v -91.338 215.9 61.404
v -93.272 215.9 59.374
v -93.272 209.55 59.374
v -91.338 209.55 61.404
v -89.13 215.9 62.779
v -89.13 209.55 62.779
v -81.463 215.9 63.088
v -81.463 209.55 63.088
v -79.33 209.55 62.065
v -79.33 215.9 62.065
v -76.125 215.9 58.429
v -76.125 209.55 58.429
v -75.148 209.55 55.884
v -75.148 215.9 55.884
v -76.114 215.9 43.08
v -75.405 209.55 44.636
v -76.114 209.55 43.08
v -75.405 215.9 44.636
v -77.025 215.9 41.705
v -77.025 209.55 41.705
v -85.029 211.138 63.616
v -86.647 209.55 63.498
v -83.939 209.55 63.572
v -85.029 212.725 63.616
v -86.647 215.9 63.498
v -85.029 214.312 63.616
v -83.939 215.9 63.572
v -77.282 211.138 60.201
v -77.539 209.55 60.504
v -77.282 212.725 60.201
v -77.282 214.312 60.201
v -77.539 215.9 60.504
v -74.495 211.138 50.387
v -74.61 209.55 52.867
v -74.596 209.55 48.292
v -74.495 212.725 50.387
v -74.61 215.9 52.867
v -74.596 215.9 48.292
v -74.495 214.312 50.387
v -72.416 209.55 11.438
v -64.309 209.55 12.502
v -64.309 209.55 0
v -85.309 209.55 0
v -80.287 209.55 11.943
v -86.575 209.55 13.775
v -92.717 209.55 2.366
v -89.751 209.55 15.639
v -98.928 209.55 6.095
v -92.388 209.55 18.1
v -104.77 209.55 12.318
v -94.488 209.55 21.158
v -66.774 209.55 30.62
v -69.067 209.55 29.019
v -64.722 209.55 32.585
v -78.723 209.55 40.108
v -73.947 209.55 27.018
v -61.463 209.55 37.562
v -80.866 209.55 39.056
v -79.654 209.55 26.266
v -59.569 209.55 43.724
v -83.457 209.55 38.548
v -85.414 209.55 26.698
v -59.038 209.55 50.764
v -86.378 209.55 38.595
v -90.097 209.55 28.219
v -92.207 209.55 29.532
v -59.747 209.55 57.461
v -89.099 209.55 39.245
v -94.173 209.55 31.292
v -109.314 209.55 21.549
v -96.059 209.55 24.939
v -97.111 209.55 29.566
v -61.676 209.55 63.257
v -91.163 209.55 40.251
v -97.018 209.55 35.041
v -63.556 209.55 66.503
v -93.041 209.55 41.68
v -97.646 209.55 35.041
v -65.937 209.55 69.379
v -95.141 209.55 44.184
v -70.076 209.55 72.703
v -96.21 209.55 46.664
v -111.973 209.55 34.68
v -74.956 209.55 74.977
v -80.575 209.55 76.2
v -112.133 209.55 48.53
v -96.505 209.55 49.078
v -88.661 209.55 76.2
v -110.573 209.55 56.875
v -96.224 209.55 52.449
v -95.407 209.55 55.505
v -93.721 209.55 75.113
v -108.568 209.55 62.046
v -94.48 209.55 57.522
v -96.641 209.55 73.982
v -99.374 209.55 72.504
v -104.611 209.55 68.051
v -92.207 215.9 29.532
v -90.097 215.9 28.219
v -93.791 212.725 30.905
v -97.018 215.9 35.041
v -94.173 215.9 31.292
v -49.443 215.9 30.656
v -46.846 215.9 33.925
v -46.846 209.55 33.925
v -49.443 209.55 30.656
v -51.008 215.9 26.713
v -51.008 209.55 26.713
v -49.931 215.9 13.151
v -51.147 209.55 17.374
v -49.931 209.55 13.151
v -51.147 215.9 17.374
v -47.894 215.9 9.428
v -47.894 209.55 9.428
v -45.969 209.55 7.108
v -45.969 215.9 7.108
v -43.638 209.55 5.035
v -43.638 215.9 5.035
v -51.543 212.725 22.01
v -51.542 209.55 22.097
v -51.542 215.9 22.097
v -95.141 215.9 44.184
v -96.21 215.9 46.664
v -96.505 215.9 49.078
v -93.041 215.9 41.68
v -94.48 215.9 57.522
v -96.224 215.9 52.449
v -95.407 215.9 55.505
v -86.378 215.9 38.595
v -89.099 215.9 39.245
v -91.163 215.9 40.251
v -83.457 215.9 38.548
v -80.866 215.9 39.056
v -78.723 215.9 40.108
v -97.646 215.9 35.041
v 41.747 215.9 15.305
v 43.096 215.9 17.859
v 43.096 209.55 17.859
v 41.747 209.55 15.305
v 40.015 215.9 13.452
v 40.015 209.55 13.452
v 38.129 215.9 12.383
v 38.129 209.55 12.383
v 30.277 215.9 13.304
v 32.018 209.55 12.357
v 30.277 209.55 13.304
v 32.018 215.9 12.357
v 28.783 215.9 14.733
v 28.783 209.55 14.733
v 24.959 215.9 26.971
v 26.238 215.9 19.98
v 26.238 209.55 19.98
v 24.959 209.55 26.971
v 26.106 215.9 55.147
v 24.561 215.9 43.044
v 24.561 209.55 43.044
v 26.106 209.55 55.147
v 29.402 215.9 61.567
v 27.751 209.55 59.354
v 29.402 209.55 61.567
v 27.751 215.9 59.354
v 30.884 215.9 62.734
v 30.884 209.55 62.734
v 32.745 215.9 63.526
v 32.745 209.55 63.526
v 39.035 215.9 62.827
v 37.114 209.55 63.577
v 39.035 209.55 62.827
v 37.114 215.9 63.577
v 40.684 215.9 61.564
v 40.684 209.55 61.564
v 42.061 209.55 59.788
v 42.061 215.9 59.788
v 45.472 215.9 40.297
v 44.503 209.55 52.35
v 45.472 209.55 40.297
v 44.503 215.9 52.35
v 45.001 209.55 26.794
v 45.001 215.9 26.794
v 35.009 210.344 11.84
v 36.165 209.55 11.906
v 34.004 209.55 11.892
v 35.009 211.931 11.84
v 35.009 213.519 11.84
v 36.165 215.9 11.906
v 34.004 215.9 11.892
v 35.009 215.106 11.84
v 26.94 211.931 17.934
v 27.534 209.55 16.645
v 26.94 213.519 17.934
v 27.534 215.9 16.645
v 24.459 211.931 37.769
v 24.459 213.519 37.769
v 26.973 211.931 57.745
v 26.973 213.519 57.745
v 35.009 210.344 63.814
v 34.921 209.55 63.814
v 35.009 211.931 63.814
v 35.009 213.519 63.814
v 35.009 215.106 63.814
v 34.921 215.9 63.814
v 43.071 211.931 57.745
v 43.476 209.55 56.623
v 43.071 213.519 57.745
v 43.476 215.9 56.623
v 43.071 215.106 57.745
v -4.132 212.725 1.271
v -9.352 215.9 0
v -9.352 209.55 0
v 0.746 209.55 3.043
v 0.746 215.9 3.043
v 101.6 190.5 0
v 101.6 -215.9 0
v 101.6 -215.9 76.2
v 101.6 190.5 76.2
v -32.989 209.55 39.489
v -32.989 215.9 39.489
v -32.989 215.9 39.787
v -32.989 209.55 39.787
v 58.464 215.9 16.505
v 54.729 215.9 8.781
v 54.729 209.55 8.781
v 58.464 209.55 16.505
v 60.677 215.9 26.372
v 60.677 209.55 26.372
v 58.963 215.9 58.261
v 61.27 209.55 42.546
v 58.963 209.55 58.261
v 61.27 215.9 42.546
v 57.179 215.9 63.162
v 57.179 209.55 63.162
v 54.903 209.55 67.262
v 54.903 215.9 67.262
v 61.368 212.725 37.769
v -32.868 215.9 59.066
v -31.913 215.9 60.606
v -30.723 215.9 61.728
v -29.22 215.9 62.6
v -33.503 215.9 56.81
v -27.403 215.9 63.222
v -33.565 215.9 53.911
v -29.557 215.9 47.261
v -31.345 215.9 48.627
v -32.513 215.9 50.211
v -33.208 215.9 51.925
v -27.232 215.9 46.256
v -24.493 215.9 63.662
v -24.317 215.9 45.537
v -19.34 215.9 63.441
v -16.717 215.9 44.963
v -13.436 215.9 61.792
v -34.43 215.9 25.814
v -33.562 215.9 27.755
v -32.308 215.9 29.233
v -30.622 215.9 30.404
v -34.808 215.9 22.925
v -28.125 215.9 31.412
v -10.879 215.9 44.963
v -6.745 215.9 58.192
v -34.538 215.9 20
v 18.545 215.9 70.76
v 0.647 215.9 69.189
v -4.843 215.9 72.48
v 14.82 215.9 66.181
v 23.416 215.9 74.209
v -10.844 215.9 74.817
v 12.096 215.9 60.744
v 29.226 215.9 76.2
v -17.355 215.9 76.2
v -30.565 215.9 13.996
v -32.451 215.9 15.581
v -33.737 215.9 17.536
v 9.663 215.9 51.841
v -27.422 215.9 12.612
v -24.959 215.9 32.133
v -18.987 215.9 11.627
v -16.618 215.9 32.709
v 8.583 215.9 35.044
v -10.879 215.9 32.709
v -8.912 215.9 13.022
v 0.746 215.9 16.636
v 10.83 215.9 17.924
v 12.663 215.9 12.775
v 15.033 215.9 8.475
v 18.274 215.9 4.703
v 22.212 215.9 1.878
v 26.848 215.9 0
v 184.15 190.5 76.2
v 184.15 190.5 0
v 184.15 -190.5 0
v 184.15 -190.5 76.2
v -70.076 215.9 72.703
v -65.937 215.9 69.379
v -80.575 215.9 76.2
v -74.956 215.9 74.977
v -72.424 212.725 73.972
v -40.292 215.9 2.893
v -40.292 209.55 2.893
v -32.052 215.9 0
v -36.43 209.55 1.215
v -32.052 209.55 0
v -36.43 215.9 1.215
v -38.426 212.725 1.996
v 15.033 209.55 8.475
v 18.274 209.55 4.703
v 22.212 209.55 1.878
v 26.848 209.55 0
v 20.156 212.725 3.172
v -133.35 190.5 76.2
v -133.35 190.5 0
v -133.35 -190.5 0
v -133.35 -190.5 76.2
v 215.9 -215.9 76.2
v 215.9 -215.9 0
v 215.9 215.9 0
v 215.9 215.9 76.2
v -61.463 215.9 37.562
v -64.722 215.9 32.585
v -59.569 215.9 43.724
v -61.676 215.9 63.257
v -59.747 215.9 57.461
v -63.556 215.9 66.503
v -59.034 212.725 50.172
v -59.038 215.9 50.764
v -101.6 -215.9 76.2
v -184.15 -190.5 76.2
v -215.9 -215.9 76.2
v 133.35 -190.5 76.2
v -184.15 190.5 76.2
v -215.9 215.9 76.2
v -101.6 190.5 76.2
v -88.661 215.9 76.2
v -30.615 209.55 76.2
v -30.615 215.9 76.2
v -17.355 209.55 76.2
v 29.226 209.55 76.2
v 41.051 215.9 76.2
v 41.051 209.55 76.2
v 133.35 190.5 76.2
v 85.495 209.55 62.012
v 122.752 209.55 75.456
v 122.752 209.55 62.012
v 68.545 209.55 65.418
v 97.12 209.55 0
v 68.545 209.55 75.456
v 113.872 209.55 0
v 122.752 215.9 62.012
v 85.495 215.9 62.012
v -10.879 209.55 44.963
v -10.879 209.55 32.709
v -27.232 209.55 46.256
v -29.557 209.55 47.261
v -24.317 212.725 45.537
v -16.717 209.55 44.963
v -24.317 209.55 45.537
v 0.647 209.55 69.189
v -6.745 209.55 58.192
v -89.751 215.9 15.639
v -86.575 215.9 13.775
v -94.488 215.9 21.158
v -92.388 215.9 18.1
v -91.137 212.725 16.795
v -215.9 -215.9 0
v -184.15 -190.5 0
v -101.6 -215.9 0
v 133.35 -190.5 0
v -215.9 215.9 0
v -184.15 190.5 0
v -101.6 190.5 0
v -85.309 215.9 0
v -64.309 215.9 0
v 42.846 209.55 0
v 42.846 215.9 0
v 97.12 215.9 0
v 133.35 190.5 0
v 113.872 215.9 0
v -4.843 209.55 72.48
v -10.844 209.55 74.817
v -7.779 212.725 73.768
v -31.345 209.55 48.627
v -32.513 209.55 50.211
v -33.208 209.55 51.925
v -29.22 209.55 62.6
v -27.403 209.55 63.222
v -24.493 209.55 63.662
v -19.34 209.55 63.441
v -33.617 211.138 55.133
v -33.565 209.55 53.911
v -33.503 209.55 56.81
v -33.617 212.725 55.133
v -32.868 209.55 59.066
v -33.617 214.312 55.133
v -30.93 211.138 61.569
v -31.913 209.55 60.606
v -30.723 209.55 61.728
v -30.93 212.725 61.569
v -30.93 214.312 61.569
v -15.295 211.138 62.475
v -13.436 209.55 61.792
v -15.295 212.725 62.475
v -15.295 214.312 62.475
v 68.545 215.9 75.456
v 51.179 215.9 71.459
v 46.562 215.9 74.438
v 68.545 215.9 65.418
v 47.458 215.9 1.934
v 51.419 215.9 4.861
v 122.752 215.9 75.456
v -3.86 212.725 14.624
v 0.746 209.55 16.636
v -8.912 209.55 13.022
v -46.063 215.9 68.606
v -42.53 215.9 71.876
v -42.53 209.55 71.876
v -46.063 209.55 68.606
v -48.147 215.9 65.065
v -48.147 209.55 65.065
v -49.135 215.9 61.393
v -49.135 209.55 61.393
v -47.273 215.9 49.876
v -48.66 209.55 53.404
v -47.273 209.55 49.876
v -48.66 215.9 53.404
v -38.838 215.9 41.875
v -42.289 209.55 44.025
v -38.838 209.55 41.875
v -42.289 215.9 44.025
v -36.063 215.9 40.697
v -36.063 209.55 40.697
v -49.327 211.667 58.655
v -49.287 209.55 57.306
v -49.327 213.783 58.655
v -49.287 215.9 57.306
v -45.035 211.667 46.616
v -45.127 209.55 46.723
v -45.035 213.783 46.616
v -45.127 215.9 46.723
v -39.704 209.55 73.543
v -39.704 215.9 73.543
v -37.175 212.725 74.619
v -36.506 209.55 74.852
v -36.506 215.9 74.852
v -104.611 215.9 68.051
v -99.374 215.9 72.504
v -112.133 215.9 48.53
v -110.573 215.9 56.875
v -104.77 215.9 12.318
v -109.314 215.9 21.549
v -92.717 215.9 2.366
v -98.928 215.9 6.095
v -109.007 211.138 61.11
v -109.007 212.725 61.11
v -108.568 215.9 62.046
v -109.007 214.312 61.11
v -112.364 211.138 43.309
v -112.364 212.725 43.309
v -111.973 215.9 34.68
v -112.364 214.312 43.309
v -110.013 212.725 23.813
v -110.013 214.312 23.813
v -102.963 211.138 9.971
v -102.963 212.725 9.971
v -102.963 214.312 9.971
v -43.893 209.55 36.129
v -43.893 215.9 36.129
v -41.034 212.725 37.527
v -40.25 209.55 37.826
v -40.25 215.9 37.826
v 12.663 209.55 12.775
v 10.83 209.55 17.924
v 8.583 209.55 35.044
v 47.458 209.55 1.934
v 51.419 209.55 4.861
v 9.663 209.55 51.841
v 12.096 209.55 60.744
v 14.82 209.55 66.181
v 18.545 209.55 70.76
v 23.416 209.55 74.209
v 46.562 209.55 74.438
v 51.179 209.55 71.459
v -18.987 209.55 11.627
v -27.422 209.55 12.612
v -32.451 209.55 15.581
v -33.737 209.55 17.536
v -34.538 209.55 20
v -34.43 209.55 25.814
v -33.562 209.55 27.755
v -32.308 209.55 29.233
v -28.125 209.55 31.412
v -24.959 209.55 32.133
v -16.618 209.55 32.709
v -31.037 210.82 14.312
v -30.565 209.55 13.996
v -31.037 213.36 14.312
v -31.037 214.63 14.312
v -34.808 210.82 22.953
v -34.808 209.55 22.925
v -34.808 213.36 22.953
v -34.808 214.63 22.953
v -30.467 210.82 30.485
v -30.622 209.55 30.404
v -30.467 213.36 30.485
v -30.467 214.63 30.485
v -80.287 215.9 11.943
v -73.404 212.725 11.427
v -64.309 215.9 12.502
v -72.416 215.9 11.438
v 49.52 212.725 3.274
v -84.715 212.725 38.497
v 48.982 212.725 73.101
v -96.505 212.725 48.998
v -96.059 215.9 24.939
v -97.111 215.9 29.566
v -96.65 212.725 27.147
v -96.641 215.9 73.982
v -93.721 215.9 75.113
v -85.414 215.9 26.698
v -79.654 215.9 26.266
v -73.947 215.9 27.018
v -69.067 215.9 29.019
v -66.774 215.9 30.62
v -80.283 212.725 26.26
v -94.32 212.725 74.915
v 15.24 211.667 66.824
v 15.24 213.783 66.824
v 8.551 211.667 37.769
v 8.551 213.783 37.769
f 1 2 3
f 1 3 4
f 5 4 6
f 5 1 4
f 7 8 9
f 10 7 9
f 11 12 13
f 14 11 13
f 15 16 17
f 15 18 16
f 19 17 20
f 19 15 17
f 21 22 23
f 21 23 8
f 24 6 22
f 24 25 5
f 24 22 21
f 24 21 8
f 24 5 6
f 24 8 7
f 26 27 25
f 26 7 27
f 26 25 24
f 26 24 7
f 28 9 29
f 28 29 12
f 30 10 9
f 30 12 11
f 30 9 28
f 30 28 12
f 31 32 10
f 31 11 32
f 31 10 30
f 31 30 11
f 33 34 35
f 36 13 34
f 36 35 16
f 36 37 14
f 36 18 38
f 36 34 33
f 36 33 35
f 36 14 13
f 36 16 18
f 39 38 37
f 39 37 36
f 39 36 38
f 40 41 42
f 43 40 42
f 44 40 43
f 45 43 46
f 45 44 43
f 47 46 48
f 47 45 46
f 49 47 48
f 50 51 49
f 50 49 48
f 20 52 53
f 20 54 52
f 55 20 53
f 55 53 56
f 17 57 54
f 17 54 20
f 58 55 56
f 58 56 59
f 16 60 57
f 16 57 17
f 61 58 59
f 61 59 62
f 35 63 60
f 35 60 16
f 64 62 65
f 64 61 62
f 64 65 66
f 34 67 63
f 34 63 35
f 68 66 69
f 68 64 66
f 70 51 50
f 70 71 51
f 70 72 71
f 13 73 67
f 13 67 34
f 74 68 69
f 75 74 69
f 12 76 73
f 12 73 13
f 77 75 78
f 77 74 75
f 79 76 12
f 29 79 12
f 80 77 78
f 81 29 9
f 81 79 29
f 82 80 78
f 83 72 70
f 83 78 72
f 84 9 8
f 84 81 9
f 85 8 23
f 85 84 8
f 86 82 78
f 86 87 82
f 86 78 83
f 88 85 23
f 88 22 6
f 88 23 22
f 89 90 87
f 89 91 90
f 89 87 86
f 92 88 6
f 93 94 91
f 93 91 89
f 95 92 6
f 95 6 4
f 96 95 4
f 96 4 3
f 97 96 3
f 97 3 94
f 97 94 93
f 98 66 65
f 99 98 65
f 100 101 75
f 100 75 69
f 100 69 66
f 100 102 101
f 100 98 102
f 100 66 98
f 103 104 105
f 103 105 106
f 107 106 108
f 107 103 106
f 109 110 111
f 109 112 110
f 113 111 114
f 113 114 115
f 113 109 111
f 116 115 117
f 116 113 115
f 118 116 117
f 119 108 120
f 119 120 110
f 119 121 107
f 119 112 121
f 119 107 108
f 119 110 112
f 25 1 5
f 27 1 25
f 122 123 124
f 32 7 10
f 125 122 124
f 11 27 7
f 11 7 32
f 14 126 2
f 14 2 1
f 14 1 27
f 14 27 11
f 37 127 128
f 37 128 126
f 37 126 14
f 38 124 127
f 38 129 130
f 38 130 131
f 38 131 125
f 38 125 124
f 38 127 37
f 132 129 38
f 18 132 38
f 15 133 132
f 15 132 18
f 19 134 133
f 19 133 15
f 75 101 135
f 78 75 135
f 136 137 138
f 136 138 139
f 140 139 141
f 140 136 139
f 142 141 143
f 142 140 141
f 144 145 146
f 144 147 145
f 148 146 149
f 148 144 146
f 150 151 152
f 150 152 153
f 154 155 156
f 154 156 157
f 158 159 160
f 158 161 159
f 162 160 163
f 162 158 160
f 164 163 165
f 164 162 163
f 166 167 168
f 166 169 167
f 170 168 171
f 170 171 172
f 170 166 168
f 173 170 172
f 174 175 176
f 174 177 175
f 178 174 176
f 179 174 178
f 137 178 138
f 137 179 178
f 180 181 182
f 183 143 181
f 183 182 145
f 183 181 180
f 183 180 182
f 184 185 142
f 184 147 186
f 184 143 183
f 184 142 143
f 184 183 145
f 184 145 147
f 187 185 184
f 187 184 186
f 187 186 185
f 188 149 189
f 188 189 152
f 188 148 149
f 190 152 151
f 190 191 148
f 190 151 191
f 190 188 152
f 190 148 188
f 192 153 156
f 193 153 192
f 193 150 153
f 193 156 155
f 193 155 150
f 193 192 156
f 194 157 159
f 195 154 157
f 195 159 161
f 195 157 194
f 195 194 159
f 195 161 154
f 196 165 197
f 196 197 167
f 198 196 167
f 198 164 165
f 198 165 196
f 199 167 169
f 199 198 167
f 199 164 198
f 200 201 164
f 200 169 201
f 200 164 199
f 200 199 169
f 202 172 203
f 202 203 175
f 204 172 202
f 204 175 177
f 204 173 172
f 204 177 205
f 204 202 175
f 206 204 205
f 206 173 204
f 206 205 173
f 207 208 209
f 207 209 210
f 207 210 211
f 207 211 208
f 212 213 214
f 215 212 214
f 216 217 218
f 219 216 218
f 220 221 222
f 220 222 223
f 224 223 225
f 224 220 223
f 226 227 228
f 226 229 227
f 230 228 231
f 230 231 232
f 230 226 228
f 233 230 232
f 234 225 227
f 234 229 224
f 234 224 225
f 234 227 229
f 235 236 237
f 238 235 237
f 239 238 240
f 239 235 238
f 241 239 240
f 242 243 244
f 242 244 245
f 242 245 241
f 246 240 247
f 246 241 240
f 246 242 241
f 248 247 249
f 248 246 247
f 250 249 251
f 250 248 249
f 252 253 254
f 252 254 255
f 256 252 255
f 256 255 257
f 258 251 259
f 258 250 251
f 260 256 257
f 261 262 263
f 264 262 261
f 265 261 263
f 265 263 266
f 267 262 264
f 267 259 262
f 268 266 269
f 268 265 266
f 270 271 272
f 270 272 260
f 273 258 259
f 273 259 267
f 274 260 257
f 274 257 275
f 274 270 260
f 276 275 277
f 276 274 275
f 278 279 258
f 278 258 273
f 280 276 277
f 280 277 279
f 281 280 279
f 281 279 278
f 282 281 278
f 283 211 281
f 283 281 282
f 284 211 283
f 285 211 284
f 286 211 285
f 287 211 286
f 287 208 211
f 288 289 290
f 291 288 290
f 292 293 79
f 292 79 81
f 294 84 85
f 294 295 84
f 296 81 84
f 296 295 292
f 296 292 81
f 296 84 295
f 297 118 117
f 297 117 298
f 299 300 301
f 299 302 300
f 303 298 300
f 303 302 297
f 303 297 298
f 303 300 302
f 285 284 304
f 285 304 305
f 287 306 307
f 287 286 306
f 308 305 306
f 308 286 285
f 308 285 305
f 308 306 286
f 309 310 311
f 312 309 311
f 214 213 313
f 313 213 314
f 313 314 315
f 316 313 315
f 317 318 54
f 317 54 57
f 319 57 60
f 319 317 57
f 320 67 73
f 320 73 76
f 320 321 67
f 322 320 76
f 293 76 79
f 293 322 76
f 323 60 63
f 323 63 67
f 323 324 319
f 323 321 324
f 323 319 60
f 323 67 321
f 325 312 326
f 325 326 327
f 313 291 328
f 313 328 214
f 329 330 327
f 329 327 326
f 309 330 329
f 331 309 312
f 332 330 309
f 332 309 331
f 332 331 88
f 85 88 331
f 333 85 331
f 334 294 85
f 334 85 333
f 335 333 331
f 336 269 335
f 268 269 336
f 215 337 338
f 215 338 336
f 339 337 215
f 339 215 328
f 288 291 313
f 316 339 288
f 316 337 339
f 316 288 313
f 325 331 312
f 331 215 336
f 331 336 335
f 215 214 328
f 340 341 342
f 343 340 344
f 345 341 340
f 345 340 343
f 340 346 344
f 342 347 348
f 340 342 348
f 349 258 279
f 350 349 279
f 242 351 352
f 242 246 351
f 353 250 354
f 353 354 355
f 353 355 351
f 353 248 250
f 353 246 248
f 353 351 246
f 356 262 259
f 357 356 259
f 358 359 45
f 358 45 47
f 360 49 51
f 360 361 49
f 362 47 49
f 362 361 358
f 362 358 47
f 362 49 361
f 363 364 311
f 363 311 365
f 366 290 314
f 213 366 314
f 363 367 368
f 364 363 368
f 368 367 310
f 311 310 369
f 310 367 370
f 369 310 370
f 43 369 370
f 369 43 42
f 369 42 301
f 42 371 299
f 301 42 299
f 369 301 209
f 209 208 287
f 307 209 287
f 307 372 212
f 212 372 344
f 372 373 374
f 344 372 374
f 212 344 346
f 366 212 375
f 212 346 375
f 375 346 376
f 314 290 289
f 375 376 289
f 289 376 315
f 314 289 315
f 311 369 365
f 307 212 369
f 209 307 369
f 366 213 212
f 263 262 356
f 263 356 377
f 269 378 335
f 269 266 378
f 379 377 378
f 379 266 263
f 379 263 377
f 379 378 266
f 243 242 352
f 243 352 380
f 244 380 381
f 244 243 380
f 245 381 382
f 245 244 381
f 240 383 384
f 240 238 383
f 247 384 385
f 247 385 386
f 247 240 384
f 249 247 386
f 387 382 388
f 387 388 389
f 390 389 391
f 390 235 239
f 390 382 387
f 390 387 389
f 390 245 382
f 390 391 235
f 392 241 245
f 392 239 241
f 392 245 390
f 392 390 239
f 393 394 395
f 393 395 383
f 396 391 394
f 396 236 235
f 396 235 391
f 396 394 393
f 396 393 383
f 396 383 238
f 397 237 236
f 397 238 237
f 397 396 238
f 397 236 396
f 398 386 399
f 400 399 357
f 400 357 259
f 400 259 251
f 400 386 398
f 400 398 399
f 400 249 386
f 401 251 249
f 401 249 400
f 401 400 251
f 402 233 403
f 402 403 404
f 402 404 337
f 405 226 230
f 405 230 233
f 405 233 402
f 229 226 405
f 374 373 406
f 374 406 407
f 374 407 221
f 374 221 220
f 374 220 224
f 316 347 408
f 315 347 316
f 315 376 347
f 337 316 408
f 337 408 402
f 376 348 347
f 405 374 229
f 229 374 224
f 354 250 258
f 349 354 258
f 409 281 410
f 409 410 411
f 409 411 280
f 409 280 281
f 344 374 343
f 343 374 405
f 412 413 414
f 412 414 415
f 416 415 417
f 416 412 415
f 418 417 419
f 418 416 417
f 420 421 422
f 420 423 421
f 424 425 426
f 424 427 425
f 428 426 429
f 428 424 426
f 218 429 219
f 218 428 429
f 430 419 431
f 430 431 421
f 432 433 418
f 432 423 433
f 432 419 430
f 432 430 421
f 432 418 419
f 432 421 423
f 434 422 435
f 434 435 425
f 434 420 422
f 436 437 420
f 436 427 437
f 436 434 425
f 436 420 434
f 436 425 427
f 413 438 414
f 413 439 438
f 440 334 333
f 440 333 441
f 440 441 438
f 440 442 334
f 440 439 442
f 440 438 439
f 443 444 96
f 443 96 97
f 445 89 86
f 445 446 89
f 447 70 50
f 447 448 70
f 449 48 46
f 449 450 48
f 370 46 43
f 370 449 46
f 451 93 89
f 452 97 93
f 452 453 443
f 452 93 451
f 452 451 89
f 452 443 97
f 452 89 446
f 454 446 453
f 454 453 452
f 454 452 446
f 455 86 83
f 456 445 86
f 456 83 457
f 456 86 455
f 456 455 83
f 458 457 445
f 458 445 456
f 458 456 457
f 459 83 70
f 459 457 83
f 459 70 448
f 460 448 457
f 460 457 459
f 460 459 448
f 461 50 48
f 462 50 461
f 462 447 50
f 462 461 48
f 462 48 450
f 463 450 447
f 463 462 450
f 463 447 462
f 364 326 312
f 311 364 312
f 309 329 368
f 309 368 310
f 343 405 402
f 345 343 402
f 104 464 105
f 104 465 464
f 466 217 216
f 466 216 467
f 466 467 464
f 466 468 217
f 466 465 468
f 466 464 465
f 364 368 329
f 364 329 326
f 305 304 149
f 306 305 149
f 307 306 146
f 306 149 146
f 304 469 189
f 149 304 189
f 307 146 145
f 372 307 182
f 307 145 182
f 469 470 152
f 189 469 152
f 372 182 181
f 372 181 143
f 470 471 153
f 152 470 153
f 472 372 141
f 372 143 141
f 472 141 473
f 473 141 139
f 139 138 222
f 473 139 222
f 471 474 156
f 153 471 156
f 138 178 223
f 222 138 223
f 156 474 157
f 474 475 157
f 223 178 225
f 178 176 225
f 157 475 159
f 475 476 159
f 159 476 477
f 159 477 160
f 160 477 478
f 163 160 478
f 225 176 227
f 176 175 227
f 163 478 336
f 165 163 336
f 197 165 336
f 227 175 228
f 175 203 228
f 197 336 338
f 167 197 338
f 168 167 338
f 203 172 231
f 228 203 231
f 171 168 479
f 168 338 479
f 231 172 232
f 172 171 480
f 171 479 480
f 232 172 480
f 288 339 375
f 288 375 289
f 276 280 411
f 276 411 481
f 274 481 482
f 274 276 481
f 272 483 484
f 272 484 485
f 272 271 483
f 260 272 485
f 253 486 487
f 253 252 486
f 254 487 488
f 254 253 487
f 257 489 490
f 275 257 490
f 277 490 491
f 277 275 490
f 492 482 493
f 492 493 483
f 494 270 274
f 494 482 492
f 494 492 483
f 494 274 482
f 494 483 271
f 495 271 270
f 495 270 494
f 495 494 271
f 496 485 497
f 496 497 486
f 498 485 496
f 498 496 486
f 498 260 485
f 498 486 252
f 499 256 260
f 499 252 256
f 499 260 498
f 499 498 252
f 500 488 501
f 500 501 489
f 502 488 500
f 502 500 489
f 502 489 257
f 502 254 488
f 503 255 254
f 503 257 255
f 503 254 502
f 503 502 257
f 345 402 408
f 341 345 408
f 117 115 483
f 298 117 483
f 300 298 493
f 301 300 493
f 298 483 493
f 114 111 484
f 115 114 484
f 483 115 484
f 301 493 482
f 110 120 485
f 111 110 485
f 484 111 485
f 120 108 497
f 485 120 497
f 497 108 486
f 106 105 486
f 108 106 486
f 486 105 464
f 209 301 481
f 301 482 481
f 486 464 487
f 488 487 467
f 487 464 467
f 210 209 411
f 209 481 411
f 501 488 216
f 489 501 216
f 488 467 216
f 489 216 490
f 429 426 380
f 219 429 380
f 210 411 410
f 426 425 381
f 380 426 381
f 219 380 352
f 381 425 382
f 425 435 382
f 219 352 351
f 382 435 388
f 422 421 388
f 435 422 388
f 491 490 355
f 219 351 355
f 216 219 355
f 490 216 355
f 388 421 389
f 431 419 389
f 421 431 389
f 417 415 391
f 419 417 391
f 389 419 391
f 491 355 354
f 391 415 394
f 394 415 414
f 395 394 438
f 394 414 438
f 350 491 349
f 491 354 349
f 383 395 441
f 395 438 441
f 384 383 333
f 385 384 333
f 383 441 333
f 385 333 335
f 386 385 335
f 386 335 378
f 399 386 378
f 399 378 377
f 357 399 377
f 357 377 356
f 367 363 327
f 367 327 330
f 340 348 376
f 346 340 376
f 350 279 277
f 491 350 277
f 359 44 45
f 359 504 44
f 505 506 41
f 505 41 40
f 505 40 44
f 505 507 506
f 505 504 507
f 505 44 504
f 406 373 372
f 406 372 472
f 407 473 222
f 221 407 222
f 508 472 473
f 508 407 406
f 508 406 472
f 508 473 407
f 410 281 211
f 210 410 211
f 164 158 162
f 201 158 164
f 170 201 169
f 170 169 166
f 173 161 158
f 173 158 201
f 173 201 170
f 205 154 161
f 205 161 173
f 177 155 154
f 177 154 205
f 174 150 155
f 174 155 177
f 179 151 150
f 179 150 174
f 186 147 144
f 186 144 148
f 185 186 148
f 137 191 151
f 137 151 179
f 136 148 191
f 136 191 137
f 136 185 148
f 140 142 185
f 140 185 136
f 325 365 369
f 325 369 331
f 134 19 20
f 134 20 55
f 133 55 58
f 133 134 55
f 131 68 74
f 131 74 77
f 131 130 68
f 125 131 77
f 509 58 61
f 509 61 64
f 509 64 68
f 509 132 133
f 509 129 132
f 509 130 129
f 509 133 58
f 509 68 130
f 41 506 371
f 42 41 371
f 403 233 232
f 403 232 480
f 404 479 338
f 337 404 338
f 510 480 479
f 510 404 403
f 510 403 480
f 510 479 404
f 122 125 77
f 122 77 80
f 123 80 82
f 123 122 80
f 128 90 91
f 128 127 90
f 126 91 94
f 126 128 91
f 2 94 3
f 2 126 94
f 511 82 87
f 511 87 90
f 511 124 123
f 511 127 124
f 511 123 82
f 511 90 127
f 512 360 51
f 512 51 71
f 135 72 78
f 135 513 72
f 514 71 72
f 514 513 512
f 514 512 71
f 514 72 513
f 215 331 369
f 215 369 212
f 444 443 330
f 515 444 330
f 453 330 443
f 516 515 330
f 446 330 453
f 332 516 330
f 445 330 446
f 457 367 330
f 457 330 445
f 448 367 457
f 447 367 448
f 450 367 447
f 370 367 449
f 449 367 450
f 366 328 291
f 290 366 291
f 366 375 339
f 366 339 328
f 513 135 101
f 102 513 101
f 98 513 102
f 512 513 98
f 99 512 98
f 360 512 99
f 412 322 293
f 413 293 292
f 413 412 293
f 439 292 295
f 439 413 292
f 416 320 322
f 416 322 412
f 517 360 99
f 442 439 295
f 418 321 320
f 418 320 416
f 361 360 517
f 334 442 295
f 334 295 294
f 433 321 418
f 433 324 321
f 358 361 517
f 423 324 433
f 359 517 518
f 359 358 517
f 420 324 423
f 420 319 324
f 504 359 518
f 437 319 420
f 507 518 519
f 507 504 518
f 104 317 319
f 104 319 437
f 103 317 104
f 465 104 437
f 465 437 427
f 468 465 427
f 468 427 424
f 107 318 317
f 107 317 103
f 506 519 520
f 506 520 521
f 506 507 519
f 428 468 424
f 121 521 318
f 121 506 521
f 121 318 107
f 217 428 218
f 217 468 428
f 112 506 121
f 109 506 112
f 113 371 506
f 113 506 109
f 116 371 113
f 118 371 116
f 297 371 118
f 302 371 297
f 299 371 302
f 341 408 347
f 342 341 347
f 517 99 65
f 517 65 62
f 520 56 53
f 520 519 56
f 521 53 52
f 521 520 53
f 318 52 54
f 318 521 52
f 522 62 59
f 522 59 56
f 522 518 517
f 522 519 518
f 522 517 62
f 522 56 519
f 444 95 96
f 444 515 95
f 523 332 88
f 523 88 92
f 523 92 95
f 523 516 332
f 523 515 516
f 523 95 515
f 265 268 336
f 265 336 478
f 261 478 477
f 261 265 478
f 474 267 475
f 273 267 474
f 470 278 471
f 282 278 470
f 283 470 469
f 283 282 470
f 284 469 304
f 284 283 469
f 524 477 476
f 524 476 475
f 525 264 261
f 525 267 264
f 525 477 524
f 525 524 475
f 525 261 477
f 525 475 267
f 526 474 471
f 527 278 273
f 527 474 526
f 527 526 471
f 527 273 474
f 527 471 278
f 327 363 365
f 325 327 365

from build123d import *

# Parameters (mm, degrees)
F0_W     = 431.8
F0_H     = 431.8
F1_DEPTH = 76.2
F2_W     = 203.2
F2_H     = 76.2
F3_DEPTH = 355.6
F4_W     = 50.8
F4_H     = 381
F5_DEPTH = 76.201
F7_DEPTH = 6.35
F8_W     = 203.2
F8_H     = 50.8
F9_DEPTH = 76.2010001


with BuildPart() as f1:
    # F0 (on Top) → F1 (new body)
    with BuildSketch(Plane.XY):
        Rectangle(F0_W, F0_H)
    extrude(amount=F1_DEPTH)

    # F2 (on face) → F3 (cut)
    with BuildSketch(Plane.XZ.offset(215.9)):
        with Locations((0, 38.1)):
            Rectangle(F2_W, F2_H)
    extrude(amount=-F3_DEPTH, mode=Mode.SUBTRACT)

    # F4 (on face) → F5 (cut, through all)
    with BuildSketch(Plane(origin=(0, 0, 0), x_dir=(1, 0, 0), z_dir=(0, 0, -1))):
        with Locations((158.75, 0)):
            Rectangle(F4_W, F4_H)
        with Locations((-158.75, 0)):
            Rectangle(F4_W, F4_H)
    extrude(amount=-F5_DEPTH, mode=Mode.SUBTRACT)

    # F6 (on face) → F7 (cut)
    with BuildSketch(Plane(origin=(0, 215.9, 0), x_dir=(-1, 0, 0), z_dir=(0, 1, 0))):
        with BuildLine():
            Line((64.3086559534, 12.5015625), (64.3086559534, 0))
            Line((64.3086559534, 0), (85.3091018042, 0))
            add(Edge.make_bspline(
                [(102.9626273076, 9.971484375), (96.4530371195, 2.3454737061), (85.3091018042, 0)],
                knots=[0, 0, 0, 0.6924376574, 0.6924376574, 0.6924376574], degree=2))
            add(Edge.make_bspline(
                [(112.3636038701, 43.308984375), (112.3636038701, 20.984765625), (102.9626273076, 9.971484375)],
                knots=[0, 0, 0, 1, 1, 1], degree=2))
            add(Edge.make_bspline(
                [(109.0067028284, 61.1104817708), (112.3636038701, 53.6442708333), (112.3636038701, 43.308984375)],
                knots=[0, 0, 0, 1, 1, 1], degree=2))
            add(Edge.make_bspline(
                [(99.3742158492, 72.5041015625), (105.6498017867, 68.5766927083), (109.0067028284, 61.1104817708)],
                knots=[0, 0, 0, 1, 1, 1], degree=2))
            add(Edge.make_bspline(
                [(88.6614694014, 76.2), (94.6222843884, 75.4779717125), (99.3742158492, 72.5041015625)],
                knots=[0.2427907915, 0.2427907915, 0.2427907915, 1, 1, 1], degree=2))
            Line((88.6614694014, 76.2), (80.5754538831, 76.2))
            add(Edge.make_bspline(
                [(65.9374970992, 69.3787109375), (71.5906234997, 75.1537011406), (80.5754538831, 76.2)],
                knots=[0, 0, 0, 0.818822401, 0.818822401, 0.818822401], degree=2))
            add(Edge.make_bspline(
                [(59.0335257451, 50.1716145833), (59.0335257451, 62.3259114583), (65.9374970992, 69.3787109375)],
                knots=[0, 0, 0, 1, 1, 1], degree=2))
            add(Edge.make_bspline(
                [(64.7220674117, 32.5850911458), (59.0335257451, 38.9102864583), (59.0335257451, 50.1716145833)],
                knots=[0, 0, 0, 1, 1, 1], degree=2))
            add(Edge.make_bspline(
                [(80.2828747034, 26.2598958333), (70.4106090784, 26.2598958333), (64.7220674117, 32.5850911458)],
                knots=[0, 0, 0, 1, 1, 1], degree=2))
            add(Edge.make_bspline(
                [(90.0972627242, 28.2194661458), (86.1698538701, 26.2598958333), (80.2828747034, 26.2598958333)],
                knots=[0, 0, 0, 1, 1, 1], degree=2))
            add(Edge.make_bspline(
                [(97.0177705367, 35.0407552083), (94.0246715784, 30.1790364583), (90.0972627242, 28.2194661458)],
                knots=[0, 0, 0, 1, 1, 1], degree=2))
            Line((97.0177705367, 35.0407552083), (97.6461559534, 35.0407552083))
            add(Edge.make_bspline(
                [(94.4876924117, 21.1583984375), (97.2327444951, 26.19375), (97.6461559534, 35.0407552083)],
                knots=[0, 0, 0, 1, 1, 1], degree=2))
            add(Edge.make_bspline(
                [(86.5749970992, 13.7748697917), (91.7426403284, 16.123046875), (94.4876924117, 21.1583984375)],
                knots=[0, 0, 0, 1, 1, 1], degree=2))
            add(Edge.make_bspline(
                [(73.4037080367, 11.4266927083), (81.4073538701, 11.4266927083), (86.5749970992, 13.7748697917)],
                knots=[0, 0, 0, 1, 1, 1], degree=2))
            add(Edge.make_bspline(
                [(64.3086559534, 12.5015625), (68.6577444951, 11.4266927083), (73.4037080367, 11.4266927083)],
                knots=[0, 0, 0, 1, 1, 1], degree=2))
        make_face()
        with BuildLine():
            add(Edge.make_bspline(
                [(85.0288382451, 63.6157552083), (80.0679007451, 63.6157552083), (77.2815075159, 60.2009765625)],
                knots=[0, 0, 0, 1, 1, 1], degree=2))
            add(Edge.make_bspline(
                [(93.2722627242, 59.3741536458), (90.0393851201, 63.6157552083), (85.0288382451, 63.6157552083)],
                knots=[0, 0, 0, 1, 1, 1], degree=2))
            add(Edge.make_bspline(
                [(96.5051403284, 48.9975260417), (96.5051403284, 55.1325520833), (93.2722627242, 59.3741536458)],
                knots=[0, 0, 0, 1, 1, 1], degree=2))
            add(Edge.make_bspline(
                [(93.0407523076, 41.6801432292), (96.5051403284, 44.8634114583), (96.5051403284, 48.9975260417)],
                knots=[0, 0, 0, 1, 1, 1], degree=2))
            add(Edge.make_bspline(
                [(84.7146455367, 38.496875), (89.5763642867, 38.496875), (93.0407523076, 41.6801432292)],
                knots=[0, 0, 0, 1, 1, 1], degree=2))
            add(Edge.make_bspline(
                [(77.0251924117, 41.7049479167), (79.5552705367, 38.496875), (84.7146455367, 38.496875)],
                knots=[0, 0, 0, 1, 1, 1], degree=2))
            add(Edge.make_bspline(
                [(74.4951142867, 50.3865885417), (74.4951142867, 44.9130208333), (77.0251924117, 41.7049479167)],
                knots=[0, 0, 0, 1, 1, 1], degree=2))
            add(Edge.make_bspline(
                [(77.2815075159, 60.2009765625), (74.4951142867, 56.7861979167), (74.4951142867, 50.3865885417)],
                knots=[0, 0, 0, 1, 1, 1], degree=2))
        make_face(mode=Mode.SUBTRACT)
        with BuildLine():
            add(Edge.make_bspline(
                [(-42.8459156165, 0), (-50.2518973403, 2.1571424157), (-54.7290393591, 8.780859375)],
                knots=[0.3256694736, 0.3256694736, 0.3256694736, 1, 1, 1], degree=2))
            Line((-42.8459156165, 0), (-26.8477042928, 0))
            add(Edge.make_bspline(
                [(-15.0332711299, 8.4749348958), (-19.370815255, 2.106933253), (-26.8477042928, 0)],
                knots=[0, 0, 0, 0.6691374514, 0.6691374514, 0.6691374514], degree=2))
            add(Edge.make_bspline(
                [(-8.5509794633, 37.7692708333), (-8.5509794633, 17.9916666667), (-15.0332711299, 8.4749348958)],
                knots=[0, 0, 0, 1, 1, 1], degree=2))
            add(Edge.make_bspline(
                [(-15.2399768591, 66.823828125), (-8.5509794633, 56.901953125), (-8.5509794633, 37.7692708333)],
                knots=[0, 0, 0, 1, 1, 1], degree=2))
            add(Edge.make_bspline(
                [(-29.2256139556, 76.2), (-20.3602653148, 74.4188171817), (-15.2399768591, 66.823828125)],
                knots=[0.234520788, 0.234520788, 0.234520788, 1, 1, 1], degree=2))
            Line((-29.2256139556, 76.2), (-41.0506894601, 76.2))
            add(Edge.make_bspline(
                [(-54.9026721716, 67.2620442708), (-49.9879088183, 74.4707828466), (-41.0506894601, 76.2)],
                knots=[0, 0, 0, 0.7601220886, 0.7601220886, 0.7601220886], degree=2))
            add(Edge.make_bspline(
                [(-61.3684273799, 37.7692708333), (-61.3684273799, 57.7783854167), (-54.9026721716, 67.2620442708)],
                knots=[0, 0, 0, 1, 1, 1], degree=2))
            add(Edge.make_bspline(
                [(-54.7290393591, 8.780859375), (-61.3684273799, 18.603515625), (-61.3684273799, 37.7692708333)],
                knots=[0, 0, 0, 1, 1, 1], degree=2))
        make_face()
        with BuildLine():
            add(Edge.make_bspline(
                [(-45.4934273799, 37.7692708333), (-45.4934273799, 23.8786458333), (-43.0956409216, 17.859375)],
                knots=[0, 0, 0, 1, 1, 1], degree=2))
            add(Edge.make_bspline(
                [(-43.0708362341, 57.7453125), (-45.4934273799, 51.6764322917), (-45.4934273799, 37.7692708333)],
                knots=[0, 0, 0, 1, 1, 1], degree=2))
            add(Edge.make_bspline(
                [(-35.0093127966, 63.8141927083), (-40.6482450883, 63.8141927083), (-43.0708362341, 57.7453125)],
                knots=[0, 0, 0, 1, 1, 1], degree=2))
            add(Edge.make_bspline(
                [(-26.9725940466, 57.7453125), (-29.4861357133, 63.8141927083), (-35.0093127966, 63.8141927083)],
                knots=[0, 0, 0, 1, 1, 1], degree=2))
            add(Edge.make_bspline(
                [(-24.4590523799, 37.7692708333), (-24.4590523799, 51.6764322917), (-26.9725940466, 57.7453125)],
                knots=[0, 0, 0, 1, 1, 1], degree=2))
            add(Edge.make_bspline(
                [(-26.9395211299, 17.9337890625), (-24.4590523799, 24.0274739583), (-24.4590523799, 37.7692708333)],
                knots=[0, 0, 0, 1, 1, 1], degree=2))
            add(Edge.make_bspline(
                [(-35.0093127966, 11.8401041667), (-29.4199898799, 11.8401041667), (-26.9395211299, 17.9337890625)],
                knots=[0, 0, 0, 1, 1, 1], degree=2))
            add(Edge.make_bspline(
                [(-43.0956409216, 17.859375), (-40.6978544633, 11.8401041667), (-35.0093127966, 11.8401041667)],
                knots=[0, 0, 0, 1, 1, 1], degree=2))
        make_face(mode=Mode.SUBTRACT)
        Polygon((-85.4951200883, 62.01171875), (-113.8716825883, 0), (-97.1202502966, 0), (-68.5452502966, 65.4182291667), (-68.5452502966, 75.455859375), (-122.7517607133, 75.455859375), (-122.7517607133, 62.01171875), align=None)
        with BuildLine():
            add(Edge.make_bspline(
                [(9.3515991344, 0), (3.9605819731, 1.0210227395), (-0.7457711299, 3.0427083333)],
                knots=[0.5050353738, 0.5050353738, 0.5050353738, 1, 1, 1], degree=2))
            Line((9.3515991344, 0), (32.0524996966, 0))
            add(Edge.make_bspline(
                [(43.6380830367, 5.0353515625), (39.0063996913, 1.4743816264), (32.0524996966, 0)],
                knots=[0, 0, 0, 0.5859606644, 0.5859606644, 0.5859606644], degree=2))
            add(Edge.make_bspline(
                [(51.5425101201, 22.0100260417), (51.5425101201, 11.1125), (43.6380830367, 5.0353515625)],
                knots=[0, 0, 0, 1, 1, 1], degree=2))
            add(Edge.make_bspline(
                [(46.8461559534, 33.9245442708), (51.5425101201, 29.5010416667), (51.5425101201, 22.0100260417)],
                knots=[0, 0, 0, 1, 1, 1], degree=2))
            add(Edge.make_bspline(
                [(32.9886038701, 39.4890625), (42.1498017867, 38.348046875), (46.8461559534, 33.9245442708)],
                knots=[0, 0, 0, 1, 1, 1], degree=2))
            Line((32.9886038701, 39.4890625), (32.9886038701, 39.78671875))
            add(Edge.make_bspline(
                [(45.0354137659, 46.6162760417), (40.7442028284, 41.6553385417), (32.9886038701, 39.78671875)],
                knots=[0, 0, 0, 1, 1, 1], degree=2))
            add(Edge.make_bspline(
                [(49.3266247034, 58.6548177083), (49.3266247034, 51.5772135417), (45.0354137659, 46.6162760417)],
                knots=[0, 0, 0, 1, 1, 1], degree=2))
            add(Edge.make_bspline(
                [(42.5301403284, 71.8757161458), (49.3266247034, 67.121484375), (49.3266247034, 58.6548177083)],
                knots=[0, 0, 0, 1, 1, 1], degree=2))
            add(Edge.make_bspline(
                [(30.6152373457, 76.2), (37.7775203209, 75.2002374407), (42.5301403284, 71.8757161458)],
                knots=[0.3007237646, 0.3007237646, 0.3007237646, 1, 1, 1], degree=2))
            Line((30.6152373457, 76.2), (17.3550933311, 76.2))
            add(Edge.make_bspline(
                [(-0.6465523799, 69.1885416667), (7.2044403936, 74.8412564636), (17.3550933311, 76.2)],
                knots=[0, 0, 0, 0.759629915, 0.759629915, 0.759629915], degree=2))
            Line((-0.6465523799, 69.1885416667), (6.7452444951, 58.191796875))
            add(Edge.make_bspline(
                [(15.2945934534, 62.4747395833), (11.4415986617, 61.2345052083), (6.7452444951, 58.191796875)],
                knots=[0, 0, 0, 1, 1, 1], degree=2))
            add(Edge.make_bspline(
                [(22.8682913701, 63.7149739583), (19.1475882451, 63.7149739583), (15.2945934534, 62.4747395833)],
                knots=[0, 0, 0, 1, 1, 1], degree=2))
            add(Edge.make_bspline(
                [(33.6169892867, 55.1325520833), (33.6169892867, 63.7149739583), (22.8682913701, 63.7149739583)],
                knots=[0, 0, 0, 1, 1, 1], degree=2))
            add(Edge.make_bspline(
                [(29.5572887659, 47.2611979167), (33.6169892867, 49.559765625), (33.6169892867, 55.1325520833)],
                knots=[0, 0, 0, 1, 1, 1], degree=2))
            add(Edge.make_bspline(
                [(16.7167288701, 44.9626302083), (25.4975882451, 44.9626302083), (29.5572887659, 47.2611979167)],
                knots=[0, 0, 0, 1, 1, 1], degree=2))
            Line((16.7167288701, 44.9626302083), (10.8793590784, 44.9626302083))
            Line((10.8793590784, 44.9626302083), (10.8793590784, 32.7091145833))
            Line((10.8793590784, 32.7091145833), (16.6175101201, 32.7091145833))
            add(Edge.make_bspline(
                [(30.4667939742, 30.4849609375), (26.1259736617, 32.7091145833), (16.6175101201, 32.7091145833)],
                knots=[0, 0, 0, 1, 1, 1], degree=2))
            add(Edge.make_bspline(
                [(34.8076142867, 22.9526041667), (34.8076142867, 28.2608072917), (30.4667939742, 30.4849609375)],
                knots=[0, 0, 0, 1, 1, 1], degree=2))
            add(Edge.make_bspline(
                [(31.0373017867, 14.3123046875), (34.8076142867, 16.9994791667), (34.8076142867, 22.9526041667)],
                knots=[0, 0, 0, 1, 1, 1], degree=2))
            add(Edge.make_bspline(
                [(19.3460257451, 11.6251302083), (27.2669892867, 11.6251302083), (31.0373017867, 14.3123046875)],
                knots=[0, 0, 0, 1, 1, 1], degree=2))
            add(Edge.make_bspline(
                [(8.9115205367, 13.0224609375), (14.1866507451, 11.6251302083), (19.3460257451, 11.6251302083)],
                knots=[0, 0, 0, 1, 1, 1], degree=2))
            add(Edge.make_bspline(
                [(-0.7457711299, 16.6356770833), (3.6363903284, 14.4197916667), (8.9115205367, 13.0224609375)],
                knots=[0, 0, 0, 1, 1, 1], degree=2))
            Line((-0.7457711299, 16.6356770833), (-0.7457711299, 3.0427083333))
        make_face()
    extrude(amount=-F7_DEPTH, mode=Mode.SUBTRACT)

    # F8 (on face) → F9 (cut, through all)
    with BuildSketch(Plane.XY.offset(76.2)):
        with Locations((0, 165.1)):
            Rectangle(F8_W, F8_H)
    extrude(amount=-F9_DEPTH, mode=Mode.SUBTRACT)


solid = f1.part
